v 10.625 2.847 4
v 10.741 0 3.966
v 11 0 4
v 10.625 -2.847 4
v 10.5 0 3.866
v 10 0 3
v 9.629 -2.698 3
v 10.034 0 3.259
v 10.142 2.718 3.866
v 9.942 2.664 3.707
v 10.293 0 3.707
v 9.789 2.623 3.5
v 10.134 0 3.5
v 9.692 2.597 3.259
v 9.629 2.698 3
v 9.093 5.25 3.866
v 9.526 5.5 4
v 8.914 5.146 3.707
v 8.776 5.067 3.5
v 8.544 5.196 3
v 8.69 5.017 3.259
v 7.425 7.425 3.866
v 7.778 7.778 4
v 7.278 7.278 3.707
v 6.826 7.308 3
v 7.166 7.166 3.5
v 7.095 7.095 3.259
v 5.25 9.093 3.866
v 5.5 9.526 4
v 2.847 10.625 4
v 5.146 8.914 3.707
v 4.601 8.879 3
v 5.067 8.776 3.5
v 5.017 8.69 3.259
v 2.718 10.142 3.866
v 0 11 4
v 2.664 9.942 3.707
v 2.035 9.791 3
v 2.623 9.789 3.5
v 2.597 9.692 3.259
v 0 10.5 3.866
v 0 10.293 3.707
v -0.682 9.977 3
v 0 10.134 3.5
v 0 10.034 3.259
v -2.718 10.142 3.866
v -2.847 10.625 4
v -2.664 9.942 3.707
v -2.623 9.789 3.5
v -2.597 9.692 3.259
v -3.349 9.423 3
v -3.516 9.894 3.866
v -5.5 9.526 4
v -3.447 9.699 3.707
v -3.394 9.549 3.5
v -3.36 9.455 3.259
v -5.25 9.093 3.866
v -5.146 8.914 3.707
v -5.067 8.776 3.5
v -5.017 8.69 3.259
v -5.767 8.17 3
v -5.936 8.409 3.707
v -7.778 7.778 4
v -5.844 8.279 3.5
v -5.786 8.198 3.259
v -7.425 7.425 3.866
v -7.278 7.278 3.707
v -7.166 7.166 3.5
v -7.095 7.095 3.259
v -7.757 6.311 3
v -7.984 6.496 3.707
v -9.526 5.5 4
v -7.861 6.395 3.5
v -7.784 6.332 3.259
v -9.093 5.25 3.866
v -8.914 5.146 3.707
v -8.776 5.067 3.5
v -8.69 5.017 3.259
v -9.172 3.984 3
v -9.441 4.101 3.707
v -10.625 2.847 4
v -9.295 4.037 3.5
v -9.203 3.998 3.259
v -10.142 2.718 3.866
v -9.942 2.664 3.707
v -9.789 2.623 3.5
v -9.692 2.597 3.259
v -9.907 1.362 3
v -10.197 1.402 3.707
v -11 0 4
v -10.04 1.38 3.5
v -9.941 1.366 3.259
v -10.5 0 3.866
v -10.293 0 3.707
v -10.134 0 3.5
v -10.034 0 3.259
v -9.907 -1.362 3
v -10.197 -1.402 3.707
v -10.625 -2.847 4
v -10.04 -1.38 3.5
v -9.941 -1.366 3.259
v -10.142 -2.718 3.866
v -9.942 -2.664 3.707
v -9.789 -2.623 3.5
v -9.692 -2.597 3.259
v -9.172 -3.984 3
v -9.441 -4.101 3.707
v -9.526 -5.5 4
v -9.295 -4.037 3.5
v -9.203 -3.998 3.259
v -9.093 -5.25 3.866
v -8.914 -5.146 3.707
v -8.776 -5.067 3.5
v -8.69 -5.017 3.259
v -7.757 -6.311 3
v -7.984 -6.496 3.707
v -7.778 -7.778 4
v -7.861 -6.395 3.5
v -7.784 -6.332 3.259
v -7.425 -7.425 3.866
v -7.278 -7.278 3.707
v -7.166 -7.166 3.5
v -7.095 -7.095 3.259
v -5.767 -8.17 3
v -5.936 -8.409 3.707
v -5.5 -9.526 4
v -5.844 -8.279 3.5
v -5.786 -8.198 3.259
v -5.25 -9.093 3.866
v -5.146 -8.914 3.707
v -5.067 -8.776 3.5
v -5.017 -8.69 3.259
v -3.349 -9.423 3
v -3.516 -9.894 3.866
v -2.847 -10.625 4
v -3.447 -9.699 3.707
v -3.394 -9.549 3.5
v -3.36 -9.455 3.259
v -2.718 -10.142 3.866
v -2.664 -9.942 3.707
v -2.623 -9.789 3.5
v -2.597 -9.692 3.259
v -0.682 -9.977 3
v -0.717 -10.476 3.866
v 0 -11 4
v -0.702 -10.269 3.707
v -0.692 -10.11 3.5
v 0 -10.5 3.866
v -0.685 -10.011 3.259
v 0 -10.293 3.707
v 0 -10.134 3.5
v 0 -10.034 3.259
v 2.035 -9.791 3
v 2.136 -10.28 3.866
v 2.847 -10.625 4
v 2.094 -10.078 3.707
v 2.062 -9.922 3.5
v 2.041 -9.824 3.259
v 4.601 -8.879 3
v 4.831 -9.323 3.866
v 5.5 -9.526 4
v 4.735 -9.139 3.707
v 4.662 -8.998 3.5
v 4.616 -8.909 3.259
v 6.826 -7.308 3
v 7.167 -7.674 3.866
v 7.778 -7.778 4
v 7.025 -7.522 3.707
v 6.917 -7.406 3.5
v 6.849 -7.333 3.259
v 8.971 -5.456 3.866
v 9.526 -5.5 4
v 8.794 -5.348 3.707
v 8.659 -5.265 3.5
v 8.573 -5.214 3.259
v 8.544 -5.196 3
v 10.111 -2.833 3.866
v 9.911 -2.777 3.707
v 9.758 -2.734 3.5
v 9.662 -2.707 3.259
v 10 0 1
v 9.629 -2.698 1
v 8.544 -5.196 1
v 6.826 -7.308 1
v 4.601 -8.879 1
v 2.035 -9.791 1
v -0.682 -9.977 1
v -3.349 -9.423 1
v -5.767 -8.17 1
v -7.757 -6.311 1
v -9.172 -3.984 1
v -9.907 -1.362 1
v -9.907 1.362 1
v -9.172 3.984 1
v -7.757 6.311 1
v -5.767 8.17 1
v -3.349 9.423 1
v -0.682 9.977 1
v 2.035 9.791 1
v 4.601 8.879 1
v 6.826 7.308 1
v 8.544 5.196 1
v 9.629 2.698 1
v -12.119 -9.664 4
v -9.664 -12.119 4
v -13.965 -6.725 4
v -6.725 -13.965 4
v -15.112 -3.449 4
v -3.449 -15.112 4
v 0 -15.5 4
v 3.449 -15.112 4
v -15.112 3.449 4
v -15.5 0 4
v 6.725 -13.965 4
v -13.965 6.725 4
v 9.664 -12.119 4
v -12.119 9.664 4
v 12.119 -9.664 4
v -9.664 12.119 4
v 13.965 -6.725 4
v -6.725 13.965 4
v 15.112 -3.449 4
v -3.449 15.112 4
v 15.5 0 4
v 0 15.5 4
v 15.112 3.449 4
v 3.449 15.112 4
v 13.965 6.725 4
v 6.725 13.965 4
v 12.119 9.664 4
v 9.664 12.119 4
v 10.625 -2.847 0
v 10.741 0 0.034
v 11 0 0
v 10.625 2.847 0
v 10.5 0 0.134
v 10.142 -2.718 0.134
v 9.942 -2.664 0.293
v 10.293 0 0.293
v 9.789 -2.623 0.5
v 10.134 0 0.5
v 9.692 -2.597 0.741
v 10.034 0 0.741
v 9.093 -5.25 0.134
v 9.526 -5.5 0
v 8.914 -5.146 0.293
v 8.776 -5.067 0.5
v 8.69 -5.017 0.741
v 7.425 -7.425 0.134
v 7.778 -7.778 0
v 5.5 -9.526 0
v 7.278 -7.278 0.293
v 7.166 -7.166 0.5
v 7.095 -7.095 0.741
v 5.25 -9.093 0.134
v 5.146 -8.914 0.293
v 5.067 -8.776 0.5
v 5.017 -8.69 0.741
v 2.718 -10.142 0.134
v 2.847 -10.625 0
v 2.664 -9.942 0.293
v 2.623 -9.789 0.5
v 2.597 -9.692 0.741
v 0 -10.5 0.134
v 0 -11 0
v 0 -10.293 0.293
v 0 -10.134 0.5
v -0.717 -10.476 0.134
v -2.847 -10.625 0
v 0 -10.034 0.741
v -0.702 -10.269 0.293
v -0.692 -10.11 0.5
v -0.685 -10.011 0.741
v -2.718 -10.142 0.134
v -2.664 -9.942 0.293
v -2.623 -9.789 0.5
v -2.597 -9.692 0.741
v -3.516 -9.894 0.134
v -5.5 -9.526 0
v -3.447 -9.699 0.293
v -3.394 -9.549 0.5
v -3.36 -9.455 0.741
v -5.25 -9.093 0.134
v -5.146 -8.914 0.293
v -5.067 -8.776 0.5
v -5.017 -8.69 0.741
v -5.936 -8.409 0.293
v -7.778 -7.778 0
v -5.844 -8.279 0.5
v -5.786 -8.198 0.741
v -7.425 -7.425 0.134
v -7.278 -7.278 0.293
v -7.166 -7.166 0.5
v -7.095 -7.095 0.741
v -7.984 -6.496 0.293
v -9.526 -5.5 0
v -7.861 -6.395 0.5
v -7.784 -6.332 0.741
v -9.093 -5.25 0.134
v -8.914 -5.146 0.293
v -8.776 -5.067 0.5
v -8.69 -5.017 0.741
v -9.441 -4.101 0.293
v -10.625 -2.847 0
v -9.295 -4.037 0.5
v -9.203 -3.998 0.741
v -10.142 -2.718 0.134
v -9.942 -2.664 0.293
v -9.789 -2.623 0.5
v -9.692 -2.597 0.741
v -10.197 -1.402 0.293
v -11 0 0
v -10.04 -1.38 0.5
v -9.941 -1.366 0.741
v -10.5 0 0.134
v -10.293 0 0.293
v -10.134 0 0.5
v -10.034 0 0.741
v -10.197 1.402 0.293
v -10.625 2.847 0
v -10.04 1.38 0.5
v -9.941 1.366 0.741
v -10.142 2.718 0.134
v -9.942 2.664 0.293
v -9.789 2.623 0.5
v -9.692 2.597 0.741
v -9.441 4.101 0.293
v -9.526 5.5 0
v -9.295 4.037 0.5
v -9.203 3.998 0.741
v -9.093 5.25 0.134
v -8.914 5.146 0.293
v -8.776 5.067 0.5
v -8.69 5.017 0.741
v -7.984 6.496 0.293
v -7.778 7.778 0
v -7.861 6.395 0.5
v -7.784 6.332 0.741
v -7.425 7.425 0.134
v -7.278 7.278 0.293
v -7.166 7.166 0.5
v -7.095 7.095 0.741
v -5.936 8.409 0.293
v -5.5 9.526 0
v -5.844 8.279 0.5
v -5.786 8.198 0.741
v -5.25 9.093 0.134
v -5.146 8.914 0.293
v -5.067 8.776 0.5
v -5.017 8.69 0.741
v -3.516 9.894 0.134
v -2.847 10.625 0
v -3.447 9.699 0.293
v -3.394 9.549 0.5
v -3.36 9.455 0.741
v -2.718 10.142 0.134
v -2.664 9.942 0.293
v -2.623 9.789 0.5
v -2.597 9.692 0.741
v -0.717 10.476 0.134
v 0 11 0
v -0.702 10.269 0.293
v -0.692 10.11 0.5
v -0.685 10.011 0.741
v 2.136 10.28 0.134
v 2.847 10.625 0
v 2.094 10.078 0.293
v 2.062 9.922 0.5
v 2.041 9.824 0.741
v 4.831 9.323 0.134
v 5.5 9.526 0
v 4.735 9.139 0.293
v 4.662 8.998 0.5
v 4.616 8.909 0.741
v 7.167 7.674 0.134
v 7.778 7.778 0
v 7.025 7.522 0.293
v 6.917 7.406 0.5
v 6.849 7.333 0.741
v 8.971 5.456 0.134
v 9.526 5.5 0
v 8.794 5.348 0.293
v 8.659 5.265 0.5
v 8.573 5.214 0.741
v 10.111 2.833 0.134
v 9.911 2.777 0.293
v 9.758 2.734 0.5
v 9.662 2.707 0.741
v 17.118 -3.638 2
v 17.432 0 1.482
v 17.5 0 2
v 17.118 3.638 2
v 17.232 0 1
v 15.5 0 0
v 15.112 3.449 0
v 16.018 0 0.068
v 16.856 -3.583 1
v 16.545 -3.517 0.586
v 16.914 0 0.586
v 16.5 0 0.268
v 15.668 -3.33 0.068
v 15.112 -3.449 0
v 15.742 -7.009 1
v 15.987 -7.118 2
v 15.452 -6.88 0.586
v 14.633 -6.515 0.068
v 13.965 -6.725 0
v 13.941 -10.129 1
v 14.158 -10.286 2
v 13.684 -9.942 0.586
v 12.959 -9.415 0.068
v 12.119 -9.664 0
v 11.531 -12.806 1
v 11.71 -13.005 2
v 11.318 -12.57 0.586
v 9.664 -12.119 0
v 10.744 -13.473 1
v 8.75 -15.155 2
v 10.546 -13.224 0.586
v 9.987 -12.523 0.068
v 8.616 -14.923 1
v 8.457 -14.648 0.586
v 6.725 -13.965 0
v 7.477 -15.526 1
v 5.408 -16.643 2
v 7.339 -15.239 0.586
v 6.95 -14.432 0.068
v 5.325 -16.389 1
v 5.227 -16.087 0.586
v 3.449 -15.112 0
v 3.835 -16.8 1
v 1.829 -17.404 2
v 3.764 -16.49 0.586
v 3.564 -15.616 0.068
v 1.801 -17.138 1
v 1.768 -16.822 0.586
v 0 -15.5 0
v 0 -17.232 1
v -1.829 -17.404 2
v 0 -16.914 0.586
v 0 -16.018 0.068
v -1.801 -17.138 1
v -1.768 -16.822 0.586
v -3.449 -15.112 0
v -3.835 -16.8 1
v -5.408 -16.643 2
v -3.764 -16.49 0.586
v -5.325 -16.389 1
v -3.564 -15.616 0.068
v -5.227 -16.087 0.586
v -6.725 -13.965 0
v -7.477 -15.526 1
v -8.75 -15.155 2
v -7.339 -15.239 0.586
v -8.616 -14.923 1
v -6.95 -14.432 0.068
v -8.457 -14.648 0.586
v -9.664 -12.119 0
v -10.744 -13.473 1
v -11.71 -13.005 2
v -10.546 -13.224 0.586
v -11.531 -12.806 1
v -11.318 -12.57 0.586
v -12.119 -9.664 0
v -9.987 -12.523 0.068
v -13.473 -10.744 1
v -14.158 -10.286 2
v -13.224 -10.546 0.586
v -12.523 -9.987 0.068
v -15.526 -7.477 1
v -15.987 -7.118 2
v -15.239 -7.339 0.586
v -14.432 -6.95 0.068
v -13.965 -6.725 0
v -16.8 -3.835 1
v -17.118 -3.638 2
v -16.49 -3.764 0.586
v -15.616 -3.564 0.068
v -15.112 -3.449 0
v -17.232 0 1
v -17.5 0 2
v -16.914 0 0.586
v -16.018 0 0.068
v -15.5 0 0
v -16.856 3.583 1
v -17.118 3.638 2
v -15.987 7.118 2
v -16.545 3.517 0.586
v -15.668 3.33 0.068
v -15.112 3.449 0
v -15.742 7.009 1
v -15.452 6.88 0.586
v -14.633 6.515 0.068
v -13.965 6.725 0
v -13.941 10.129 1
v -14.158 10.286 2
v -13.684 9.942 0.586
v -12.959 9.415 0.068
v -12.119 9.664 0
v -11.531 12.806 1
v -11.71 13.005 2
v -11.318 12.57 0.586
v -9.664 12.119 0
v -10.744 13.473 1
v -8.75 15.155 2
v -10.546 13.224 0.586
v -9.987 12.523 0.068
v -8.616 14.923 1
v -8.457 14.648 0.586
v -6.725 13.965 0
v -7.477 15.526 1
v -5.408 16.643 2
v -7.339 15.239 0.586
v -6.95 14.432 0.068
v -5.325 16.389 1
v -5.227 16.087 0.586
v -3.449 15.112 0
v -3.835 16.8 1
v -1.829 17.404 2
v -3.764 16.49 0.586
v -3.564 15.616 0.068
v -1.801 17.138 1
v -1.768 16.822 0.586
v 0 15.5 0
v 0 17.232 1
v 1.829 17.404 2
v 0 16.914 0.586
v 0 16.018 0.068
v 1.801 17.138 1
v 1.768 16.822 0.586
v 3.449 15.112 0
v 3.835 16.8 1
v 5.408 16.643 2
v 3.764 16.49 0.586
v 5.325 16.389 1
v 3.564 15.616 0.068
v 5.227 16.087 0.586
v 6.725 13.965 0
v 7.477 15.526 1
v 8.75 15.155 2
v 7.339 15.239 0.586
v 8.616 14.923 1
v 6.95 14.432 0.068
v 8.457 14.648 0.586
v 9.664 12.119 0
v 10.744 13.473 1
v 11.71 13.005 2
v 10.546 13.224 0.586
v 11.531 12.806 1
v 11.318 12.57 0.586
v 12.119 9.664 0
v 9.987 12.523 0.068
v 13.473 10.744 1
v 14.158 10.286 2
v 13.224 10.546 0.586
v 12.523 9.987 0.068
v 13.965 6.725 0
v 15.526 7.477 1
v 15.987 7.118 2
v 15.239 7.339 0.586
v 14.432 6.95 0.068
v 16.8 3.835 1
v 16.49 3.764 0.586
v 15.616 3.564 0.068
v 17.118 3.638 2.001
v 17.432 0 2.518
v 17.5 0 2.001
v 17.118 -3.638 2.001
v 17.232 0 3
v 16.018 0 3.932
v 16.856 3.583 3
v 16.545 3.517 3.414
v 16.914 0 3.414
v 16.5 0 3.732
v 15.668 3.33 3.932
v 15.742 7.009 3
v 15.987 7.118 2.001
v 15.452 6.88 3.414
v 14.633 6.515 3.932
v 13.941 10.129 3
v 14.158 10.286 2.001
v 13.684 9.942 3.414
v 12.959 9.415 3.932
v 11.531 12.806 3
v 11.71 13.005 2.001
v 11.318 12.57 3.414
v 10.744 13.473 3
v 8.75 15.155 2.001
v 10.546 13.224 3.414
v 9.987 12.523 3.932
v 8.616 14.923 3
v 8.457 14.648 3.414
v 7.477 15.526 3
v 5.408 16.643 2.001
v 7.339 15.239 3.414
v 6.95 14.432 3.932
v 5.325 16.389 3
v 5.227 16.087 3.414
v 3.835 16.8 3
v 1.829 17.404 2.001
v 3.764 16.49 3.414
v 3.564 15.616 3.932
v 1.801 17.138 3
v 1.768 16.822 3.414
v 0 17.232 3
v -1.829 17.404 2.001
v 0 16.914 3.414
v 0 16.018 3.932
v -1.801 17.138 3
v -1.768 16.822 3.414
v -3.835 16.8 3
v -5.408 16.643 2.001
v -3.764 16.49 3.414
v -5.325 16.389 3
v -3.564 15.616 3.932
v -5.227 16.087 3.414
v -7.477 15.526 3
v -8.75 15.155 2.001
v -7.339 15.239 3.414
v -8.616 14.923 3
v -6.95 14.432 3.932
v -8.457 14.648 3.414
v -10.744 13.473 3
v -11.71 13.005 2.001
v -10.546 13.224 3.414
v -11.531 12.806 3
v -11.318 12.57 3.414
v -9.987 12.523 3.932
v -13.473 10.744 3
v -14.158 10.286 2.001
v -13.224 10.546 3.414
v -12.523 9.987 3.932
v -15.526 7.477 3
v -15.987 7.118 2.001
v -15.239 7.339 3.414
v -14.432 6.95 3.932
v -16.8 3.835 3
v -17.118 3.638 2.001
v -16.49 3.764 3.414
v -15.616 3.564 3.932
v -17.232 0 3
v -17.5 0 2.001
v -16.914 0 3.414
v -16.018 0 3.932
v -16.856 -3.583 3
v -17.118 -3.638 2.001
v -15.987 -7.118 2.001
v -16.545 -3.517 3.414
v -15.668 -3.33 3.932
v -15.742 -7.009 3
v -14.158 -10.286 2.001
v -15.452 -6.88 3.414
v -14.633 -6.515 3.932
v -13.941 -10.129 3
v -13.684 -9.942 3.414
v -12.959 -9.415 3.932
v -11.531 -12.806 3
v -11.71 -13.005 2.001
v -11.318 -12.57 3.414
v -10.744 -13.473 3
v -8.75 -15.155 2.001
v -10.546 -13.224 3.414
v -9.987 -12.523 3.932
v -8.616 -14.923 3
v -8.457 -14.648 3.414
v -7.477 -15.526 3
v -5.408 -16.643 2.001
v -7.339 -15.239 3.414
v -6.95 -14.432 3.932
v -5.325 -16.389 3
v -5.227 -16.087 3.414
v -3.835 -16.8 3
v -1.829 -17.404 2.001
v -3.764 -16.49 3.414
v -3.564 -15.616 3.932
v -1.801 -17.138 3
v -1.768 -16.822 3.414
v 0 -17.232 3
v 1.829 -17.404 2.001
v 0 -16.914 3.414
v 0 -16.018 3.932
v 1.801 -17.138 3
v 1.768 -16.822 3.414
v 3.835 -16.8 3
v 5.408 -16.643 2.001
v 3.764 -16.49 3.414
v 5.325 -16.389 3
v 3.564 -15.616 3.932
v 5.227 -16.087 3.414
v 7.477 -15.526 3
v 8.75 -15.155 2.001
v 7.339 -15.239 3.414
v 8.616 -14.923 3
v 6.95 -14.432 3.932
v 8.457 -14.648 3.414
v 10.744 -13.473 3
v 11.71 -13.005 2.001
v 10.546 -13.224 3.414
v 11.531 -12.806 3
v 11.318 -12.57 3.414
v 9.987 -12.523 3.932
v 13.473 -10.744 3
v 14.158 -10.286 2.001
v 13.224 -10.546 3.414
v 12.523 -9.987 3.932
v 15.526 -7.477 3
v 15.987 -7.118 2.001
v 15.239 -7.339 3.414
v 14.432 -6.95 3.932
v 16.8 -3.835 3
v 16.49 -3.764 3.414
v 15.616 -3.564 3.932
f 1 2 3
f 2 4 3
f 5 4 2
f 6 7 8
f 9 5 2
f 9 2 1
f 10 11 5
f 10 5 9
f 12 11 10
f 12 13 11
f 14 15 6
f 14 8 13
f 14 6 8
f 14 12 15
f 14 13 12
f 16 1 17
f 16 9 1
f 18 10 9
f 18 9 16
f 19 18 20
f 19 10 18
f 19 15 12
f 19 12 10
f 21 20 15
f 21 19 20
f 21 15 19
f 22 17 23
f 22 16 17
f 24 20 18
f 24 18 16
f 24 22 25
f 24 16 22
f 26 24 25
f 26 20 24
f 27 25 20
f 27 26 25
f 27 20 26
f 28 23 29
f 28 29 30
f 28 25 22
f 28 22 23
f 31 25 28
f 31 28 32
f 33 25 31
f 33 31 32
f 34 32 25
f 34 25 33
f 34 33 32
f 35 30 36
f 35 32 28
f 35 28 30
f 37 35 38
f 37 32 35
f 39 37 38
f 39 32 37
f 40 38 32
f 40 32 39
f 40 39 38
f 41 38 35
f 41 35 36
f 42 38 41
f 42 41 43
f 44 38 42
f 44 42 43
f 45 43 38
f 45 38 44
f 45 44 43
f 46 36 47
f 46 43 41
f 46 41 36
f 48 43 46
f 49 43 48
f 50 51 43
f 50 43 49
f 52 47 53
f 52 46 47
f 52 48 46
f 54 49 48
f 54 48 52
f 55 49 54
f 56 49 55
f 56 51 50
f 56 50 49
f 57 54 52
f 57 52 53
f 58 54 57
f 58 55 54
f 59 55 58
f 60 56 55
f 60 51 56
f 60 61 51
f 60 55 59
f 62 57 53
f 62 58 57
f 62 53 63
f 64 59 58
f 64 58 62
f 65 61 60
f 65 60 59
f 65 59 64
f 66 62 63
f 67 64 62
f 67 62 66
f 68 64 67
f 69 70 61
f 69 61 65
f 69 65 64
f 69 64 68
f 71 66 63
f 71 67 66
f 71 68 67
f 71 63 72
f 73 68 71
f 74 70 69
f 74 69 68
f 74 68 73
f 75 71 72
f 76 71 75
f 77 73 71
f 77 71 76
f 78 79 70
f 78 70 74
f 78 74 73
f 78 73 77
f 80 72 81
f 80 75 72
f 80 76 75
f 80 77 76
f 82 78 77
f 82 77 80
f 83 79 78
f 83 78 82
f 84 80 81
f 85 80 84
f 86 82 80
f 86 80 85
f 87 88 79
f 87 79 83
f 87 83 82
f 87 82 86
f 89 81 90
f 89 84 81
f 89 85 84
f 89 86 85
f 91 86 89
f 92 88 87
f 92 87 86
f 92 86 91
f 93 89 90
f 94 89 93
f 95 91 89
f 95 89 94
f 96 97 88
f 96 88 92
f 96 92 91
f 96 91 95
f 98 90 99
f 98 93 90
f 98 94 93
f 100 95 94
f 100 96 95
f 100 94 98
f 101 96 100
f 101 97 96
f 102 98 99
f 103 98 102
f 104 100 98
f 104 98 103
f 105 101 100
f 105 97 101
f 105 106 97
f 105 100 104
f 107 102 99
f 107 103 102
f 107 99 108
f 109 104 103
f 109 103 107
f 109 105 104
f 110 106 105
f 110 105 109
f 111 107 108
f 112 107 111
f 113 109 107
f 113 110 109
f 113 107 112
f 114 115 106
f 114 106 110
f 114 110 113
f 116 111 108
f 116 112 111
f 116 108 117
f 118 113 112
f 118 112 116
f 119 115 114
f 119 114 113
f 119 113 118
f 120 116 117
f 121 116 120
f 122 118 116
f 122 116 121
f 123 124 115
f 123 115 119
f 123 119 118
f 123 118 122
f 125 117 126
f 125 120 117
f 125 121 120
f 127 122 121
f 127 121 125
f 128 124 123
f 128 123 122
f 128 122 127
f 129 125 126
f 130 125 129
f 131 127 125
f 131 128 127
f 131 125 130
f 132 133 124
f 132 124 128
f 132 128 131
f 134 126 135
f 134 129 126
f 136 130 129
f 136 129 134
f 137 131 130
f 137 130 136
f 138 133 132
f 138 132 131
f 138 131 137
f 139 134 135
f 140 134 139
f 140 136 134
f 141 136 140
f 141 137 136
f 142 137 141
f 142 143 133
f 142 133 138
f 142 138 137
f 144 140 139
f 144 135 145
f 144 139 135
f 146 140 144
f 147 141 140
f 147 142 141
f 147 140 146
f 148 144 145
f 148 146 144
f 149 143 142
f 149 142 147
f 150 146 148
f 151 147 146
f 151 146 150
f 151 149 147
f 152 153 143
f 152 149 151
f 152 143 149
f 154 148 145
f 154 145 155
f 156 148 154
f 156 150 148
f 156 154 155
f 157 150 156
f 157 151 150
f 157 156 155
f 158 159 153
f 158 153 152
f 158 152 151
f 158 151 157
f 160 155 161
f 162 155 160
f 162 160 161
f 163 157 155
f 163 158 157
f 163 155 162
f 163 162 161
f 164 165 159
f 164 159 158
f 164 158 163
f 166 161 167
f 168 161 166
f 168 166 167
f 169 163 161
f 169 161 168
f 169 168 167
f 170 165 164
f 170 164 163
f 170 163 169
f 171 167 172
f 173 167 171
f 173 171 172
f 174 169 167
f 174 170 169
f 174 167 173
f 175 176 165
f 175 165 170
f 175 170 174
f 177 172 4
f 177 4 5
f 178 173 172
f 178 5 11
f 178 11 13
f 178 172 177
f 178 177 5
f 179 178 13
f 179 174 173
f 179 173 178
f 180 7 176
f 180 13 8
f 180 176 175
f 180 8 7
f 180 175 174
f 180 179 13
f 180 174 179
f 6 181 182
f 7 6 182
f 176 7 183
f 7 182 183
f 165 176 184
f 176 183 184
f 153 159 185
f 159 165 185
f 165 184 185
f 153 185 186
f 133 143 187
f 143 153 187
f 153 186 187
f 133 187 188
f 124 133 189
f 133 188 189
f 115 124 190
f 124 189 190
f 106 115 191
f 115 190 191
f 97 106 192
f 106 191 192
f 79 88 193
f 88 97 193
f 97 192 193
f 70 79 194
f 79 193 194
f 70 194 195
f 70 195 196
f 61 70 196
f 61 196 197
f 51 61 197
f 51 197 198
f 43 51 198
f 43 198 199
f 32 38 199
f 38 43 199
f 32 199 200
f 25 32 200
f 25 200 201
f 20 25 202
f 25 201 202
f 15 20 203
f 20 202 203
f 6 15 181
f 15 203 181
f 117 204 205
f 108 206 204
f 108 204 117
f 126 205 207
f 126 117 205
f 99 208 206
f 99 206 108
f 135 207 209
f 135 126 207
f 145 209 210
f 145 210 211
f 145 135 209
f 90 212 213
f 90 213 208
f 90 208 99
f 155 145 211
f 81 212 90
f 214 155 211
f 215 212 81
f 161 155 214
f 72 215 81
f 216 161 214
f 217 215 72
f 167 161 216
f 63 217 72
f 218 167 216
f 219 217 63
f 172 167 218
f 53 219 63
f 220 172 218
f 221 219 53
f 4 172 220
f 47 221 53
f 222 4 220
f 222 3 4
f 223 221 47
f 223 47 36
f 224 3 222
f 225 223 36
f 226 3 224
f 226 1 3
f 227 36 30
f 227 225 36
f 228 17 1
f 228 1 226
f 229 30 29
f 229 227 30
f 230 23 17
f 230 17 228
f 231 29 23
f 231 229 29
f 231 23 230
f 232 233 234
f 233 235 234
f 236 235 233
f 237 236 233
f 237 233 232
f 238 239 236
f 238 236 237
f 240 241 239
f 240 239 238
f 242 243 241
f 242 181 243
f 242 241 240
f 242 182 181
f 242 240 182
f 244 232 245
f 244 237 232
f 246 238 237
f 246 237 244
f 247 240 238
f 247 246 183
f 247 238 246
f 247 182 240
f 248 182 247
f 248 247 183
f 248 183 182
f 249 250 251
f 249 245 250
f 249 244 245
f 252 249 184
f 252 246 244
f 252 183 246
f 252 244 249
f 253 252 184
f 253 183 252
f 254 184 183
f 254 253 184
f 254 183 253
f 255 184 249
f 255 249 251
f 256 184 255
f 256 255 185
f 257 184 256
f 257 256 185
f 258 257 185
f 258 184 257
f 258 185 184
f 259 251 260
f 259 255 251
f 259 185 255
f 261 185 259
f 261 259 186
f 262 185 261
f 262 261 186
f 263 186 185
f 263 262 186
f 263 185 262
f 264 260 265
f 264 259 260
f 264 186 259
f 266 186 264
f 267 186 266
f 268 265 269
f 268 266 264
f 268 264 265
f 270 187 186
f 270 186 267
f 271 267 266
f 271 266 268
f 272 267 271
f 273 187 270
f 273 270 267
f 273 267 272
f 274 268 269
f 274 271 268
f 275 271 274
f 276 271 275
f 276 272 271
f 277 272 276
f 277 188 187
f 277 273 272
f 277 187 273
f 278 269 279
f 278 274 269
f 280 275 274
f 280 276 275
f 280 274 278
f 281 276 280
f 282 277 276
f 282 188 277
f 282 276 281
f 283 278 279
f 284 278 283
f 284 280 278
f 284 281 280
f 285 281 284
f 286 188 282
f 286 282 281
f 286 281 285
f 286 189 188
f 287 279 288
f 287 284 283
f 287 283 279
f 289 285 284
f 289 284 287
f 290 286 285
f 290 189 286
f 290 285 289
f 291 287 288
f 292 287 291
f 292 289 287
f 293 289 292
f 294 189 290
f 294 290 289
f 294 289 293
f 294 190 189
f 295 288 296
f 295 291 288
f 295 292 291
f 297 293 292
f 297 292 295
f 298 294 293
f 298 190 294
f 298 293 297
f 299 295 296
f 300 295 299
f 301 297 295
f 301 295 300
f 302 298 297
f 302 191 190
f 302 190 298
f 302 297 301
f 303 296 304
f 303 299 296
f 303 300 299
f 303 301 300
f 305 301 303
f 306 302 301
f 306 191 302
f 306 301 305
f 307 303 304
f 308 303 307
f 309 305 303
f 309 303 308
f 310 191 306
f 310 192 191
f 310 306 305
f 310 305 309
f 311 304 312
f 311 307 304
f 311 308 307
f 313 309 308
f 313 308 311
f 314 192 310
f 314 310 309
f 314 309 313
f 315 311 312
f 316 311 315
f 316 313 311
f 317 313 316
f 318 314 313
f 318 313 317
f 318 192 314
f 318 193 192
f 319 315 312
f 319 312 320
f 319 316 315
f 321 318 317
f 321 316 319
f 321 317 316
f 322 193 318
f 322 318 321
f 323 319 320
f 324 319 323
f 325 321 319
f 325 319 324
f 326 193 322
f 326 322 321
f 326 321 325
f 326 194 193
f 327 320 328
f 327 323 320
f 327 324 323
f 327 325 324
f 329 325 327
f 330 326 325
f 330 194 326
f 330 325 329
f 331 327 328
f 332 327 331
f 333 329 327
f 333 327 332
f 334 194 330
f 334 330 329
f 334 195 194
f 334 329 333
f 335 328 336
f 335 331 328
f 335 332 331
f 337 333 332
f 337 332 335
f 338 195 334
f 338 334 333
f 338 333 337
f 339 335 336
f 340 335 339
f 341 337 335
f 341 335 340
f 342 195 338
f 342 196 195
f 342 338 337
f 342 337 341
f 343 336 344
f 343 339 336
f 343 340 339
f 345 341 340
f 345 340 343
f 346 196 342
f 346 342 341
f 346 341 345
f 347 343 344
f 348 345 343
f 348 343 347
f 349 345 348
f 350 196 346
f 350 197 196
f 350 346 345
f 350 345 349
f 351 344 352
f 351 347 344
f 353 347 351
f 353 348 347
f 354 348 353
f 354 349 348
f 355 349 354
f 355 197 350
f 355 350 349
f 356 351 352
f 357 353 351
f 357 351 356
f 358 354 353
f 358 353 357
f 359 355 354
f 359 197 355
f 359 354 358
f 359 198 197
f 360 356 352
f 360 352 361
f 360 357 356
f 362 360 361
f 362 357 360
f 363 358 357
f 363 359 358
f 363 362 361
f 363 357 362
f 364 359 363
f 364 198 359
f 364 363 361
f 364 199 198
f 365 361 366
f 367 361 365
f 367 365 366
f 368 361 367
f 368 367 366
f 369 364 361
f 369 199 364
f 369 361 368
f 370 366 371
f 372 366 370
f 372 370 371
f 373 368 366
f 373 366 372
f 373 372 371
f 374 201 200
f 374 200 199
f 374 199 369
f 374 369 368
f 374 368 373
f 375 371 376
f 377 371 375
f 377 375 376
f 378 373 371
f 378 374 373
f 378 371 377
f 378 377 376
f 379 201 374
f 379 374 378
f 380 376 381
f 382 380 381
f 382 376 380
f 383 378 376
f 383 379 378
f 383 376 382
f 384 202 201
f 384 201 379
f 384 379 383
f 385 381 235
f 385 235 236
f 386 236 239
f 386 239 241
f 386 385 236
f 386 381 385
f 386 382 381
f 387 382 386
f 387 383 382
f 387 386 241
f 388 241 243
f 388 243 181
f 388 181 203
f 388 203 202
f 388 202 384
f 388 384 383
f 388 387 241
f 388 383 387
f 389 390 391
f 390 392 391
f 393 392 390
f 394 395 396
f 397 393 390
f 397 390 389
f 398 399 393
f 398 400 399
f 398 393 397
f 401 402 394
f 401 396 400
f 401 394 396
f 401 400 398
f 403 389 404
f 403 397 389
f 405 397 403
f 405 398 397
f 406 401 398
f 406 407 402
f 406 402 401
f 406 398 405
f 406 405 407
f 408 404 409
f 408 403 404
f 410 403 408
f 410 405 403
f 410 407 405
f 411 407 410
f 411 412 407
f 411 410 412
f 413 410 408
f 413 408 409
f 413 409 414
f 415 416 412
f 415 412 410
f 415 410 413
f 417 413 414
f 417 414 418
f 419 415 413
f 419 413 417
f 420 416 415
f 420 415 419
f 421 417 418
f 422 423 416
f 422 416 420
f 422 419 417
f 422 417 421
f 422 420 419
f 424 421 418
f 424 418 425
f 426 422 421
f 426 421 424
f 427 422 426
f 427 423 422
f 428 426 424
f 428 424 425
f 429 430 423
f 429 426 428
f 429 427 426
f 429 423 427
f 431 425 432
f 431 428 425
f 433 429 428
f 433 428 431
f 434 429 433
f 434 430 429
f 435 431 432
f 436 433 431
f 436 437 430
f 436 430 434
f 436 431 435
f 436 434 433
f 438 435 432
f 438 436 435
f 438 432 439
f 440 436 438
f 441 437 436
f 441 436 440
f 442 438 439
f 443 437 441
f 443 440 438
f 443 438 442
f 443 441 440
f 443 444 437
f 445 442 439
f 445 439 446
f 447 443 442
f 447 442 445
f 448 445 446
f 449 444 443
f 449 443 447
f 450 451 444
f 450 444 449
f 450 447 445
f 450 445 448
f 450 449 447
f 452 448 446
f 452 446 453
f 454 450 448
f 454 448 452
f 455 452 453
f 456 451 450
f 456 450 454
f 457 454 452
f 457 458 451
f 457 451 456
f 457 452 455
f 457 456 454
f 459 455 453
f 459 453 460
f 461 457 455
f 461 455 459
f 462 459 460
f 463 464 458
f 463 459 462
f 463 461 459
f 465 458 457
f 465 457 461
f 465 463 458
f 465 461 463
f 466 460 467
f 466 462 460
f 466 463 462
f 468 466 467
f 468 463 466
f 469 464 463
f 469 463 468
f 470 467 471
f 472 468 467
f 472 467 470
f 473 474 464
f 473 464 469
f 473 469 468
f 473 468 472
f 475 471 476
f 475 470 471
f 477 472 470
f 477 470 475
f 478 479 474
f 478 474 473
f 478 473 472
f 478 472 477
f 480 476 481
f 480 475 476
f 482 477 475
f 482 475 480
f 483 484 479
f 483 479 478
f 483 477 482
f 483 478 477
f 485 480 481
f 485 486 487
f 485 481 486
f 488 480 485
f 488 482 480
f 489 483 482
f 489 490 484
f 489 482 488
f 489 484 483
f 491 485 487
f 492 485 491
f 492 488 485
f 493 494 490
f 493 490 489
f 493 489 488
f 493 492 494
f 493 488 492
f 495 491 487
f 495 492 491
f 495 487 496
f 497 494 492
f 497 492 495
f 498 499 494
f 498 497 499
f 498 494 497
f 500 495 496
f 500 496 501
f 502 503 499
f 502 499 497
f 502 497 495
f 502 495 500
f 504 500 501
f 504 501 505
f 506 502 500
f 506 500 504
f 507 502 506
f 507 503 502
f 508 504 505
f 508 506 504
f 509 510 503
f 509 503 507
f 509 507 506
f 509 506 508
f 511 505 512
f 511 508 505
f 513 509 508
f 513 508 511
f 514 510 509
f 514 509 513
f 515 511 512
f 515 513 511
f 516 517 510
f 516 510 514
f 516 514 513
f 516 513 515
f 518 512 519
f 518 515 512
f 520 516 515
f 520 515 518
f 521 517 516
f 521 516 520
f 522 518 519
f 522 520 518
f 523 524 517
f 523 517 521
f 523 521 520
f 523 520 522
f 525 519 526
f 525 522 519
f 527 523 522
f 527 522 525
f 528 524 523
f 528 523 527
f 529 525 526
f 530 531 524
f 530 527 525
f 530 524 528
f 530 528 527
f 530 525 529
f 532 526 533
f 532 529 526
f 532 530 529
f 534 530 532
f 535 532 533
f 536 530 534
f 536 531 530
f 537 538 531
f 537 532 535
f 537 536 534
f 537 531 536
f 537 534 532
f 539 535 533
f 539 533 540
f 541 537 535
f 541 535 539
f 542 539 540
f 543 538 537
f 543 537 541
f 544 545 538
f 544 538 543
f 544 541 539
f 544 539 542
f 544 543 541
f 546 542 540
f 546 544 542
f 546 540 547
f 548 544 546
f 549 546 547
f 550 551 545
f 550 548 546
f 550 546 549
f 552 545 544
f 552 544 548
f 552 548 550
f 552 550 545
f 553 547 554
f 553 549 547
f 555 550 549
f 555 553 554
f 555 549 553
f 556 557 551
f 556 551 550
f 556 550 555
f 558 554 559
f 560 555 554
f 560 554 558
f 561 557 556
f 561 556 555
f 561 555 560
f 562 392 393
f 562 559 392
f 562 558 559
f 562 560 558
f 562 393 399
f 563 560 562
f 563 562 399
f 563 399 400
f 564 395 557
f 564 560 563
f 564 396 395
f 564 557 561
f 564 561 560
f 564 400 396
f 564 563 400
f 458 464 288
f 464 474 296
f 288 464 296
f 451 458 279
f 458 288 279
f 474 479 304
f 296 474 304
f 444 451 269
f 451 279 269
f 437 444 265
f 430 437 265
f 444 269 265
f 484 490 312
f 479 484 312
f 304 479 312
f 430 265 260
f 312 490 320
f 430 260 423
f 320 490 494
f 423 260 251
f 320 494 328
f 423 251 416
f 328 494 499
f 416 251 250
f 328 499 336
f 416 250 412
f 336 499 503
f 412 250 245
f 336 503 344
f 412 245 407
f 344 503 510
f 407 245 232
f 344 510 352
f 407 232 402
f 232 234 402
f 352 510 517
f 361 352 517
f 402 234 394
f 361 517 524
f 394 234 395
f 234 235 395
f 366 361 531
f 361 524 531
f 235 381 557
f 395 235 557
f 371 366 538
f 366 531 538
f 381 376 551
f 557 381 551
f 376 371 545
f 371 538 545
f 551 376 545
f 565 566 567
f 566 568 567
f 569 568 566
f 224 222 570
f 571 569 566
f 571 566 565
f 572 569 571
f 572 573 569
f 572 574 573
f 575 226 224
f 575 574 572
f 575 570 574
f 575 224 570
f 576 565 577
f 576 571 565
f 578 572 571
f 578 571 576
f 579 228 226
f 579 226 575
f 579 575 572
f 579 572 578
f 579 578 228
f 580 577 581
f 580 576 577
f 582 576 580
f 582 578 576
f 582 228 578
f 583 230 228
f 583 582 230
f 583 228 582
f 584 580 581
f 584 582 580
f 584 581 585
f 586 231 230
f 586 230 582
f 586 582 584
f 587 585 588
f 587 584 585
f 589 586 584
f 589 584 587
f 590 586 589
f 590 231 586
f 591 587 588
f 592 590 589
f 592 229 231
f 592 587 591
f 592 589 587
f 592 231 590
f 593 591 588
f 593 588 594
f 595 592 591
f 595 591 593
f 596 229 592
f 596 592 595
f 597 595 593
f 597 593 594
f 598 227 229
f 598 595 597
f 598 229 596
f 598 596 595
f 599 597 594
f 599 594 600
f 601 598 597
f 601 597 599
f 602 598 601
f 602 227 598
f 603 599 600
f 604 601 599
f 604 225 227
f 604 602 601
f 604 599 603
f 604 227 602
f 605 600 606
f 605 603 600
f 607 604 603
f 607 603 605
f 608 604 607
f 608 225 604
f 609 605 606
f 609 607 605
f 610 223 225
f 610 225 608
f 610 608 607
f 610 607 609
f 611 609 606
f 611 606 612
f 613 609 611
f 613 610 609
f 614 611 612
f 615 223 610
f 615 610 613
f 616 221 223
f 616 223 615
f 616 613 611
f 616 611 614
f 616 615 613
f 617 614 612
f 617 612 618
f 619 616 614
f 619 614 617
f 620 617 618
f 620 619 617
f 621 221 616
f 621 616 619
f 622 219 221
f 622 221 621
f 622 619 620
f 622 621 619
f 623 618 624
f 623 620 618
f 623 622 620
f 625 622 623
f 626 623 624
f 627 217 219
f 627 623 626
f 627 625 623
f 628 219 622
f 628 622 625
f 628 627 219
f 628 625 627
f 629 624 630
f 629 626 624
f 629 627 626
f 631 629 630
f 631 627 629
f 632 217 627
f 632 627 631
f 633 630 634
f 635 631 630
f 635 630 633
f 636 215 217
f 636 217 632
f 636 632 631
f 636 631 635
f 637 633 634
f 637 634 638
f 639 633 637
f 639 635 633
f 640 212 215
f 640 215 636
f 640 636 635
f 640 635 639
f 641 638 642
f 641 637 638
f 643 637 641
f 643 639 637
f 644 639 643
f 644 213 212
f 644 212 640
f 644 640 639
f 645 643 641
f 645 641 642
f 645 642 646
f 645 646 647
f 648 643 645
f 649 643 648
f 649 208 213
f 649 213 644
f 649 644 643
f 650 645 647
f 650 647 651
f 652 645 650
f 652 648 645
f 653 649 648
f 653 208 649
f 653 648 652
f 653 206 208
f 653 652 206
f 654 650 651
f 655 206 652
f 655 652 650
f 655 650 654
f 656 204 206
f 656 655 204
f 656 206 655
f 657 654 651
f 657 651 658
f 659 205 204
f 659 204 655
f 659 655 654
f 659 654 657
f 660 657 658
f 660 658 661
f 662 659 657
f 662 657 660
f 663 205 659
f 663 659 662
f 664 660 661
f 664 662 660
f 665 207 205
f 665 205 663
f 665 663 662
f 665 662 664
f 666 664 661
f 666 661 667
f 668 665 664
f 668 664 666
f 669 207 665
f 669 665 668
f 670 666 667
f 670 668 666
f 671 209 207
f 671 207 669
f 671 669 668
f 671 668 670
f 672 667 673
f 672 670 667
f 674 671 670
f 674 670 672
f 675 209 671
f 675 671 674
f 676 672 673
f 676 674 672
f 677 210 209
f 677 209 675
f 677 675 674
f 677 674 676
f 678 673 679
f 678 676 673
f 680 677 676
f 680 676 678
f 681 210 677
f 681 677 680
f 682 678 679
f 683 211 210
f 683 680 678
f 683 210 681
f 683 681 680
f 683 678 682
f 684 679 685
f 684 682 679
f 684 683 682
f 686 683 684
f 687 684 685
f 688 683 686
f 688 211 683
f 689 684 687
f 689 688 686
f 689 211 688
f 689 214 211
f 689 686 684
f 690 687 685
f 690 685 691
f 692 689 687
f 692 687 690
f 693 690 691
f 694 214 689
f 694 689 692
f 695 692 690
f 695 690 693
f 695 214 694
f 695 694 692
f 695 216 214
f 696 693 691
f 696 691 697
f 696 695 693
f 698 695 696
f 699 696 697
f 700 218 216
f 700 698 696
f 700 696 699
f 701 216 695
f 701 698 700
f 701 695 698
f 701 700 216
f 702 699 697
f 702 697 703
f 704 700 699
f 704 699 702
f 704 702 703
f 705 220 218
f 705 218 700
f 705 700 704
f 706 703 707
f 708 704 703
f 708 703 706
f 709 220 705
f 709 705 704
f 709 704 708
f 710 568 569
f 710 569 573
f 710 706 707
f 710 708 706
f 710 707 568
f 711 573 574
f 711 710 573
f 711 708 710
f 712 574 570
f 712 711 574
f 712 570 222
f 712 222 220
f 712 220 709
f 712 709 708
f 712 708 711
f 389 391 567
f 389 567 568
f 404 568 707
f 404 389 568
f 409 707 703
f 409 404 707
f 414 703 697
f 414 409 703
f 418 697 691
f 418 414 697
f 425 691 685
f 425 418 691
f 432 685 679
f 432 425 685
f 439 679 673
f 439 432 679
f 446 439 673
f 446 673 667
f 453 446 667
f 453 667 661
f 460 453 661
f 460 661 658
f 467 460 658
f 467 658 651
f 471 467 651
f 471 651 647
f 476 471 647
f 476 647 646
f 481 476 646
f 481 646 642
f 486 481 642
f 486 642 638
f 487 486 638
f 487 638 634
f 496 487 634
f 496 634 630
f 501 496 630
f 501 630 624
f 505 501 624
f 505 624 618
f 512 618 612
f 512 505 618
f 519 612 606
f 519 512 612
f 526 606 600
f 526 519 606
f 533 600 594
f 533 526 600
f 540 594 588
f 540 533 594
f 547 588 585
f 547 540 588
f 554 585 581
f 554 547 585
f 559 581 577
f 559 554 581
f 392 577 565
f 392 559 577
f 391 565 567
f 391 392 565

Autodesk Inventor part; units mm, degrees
ref_plane "YZ Plane" through (0, 0, 0) normal (1, 0, 0) x (0, 1, 0)
ref_plane "XZ Plane" through (0, 0, 0) normal (0, 1, 0) x (-1, 0, 0)
ref_plane "XY Plane" through (0, 0, 0) normal (0, 0, 1) x (1, 0, 0)
sketch "Sketch1" plane through (0, 0, 0) normal (0, 0, 1) x (1, 0, 0)
  circle A0 centre (0, 0) radius 17.5
  circle A1 centre (0, 0) radius 10
  dimension "d0" = 35
  dimension "d1" = 20
extrude "Extrusion1" add sketch "Sketch1" along normal blind 4
fillet "Fillet1" radius 2 2 edges at (-17.5, 0, 4) (-17.5, 0, 0)
fillet "Fillet2" radius 1 2 edges at (-10, 0, 0) (-10, 0, 4)
properties part number "Thrust Bearing" material "Stainless Steel"
